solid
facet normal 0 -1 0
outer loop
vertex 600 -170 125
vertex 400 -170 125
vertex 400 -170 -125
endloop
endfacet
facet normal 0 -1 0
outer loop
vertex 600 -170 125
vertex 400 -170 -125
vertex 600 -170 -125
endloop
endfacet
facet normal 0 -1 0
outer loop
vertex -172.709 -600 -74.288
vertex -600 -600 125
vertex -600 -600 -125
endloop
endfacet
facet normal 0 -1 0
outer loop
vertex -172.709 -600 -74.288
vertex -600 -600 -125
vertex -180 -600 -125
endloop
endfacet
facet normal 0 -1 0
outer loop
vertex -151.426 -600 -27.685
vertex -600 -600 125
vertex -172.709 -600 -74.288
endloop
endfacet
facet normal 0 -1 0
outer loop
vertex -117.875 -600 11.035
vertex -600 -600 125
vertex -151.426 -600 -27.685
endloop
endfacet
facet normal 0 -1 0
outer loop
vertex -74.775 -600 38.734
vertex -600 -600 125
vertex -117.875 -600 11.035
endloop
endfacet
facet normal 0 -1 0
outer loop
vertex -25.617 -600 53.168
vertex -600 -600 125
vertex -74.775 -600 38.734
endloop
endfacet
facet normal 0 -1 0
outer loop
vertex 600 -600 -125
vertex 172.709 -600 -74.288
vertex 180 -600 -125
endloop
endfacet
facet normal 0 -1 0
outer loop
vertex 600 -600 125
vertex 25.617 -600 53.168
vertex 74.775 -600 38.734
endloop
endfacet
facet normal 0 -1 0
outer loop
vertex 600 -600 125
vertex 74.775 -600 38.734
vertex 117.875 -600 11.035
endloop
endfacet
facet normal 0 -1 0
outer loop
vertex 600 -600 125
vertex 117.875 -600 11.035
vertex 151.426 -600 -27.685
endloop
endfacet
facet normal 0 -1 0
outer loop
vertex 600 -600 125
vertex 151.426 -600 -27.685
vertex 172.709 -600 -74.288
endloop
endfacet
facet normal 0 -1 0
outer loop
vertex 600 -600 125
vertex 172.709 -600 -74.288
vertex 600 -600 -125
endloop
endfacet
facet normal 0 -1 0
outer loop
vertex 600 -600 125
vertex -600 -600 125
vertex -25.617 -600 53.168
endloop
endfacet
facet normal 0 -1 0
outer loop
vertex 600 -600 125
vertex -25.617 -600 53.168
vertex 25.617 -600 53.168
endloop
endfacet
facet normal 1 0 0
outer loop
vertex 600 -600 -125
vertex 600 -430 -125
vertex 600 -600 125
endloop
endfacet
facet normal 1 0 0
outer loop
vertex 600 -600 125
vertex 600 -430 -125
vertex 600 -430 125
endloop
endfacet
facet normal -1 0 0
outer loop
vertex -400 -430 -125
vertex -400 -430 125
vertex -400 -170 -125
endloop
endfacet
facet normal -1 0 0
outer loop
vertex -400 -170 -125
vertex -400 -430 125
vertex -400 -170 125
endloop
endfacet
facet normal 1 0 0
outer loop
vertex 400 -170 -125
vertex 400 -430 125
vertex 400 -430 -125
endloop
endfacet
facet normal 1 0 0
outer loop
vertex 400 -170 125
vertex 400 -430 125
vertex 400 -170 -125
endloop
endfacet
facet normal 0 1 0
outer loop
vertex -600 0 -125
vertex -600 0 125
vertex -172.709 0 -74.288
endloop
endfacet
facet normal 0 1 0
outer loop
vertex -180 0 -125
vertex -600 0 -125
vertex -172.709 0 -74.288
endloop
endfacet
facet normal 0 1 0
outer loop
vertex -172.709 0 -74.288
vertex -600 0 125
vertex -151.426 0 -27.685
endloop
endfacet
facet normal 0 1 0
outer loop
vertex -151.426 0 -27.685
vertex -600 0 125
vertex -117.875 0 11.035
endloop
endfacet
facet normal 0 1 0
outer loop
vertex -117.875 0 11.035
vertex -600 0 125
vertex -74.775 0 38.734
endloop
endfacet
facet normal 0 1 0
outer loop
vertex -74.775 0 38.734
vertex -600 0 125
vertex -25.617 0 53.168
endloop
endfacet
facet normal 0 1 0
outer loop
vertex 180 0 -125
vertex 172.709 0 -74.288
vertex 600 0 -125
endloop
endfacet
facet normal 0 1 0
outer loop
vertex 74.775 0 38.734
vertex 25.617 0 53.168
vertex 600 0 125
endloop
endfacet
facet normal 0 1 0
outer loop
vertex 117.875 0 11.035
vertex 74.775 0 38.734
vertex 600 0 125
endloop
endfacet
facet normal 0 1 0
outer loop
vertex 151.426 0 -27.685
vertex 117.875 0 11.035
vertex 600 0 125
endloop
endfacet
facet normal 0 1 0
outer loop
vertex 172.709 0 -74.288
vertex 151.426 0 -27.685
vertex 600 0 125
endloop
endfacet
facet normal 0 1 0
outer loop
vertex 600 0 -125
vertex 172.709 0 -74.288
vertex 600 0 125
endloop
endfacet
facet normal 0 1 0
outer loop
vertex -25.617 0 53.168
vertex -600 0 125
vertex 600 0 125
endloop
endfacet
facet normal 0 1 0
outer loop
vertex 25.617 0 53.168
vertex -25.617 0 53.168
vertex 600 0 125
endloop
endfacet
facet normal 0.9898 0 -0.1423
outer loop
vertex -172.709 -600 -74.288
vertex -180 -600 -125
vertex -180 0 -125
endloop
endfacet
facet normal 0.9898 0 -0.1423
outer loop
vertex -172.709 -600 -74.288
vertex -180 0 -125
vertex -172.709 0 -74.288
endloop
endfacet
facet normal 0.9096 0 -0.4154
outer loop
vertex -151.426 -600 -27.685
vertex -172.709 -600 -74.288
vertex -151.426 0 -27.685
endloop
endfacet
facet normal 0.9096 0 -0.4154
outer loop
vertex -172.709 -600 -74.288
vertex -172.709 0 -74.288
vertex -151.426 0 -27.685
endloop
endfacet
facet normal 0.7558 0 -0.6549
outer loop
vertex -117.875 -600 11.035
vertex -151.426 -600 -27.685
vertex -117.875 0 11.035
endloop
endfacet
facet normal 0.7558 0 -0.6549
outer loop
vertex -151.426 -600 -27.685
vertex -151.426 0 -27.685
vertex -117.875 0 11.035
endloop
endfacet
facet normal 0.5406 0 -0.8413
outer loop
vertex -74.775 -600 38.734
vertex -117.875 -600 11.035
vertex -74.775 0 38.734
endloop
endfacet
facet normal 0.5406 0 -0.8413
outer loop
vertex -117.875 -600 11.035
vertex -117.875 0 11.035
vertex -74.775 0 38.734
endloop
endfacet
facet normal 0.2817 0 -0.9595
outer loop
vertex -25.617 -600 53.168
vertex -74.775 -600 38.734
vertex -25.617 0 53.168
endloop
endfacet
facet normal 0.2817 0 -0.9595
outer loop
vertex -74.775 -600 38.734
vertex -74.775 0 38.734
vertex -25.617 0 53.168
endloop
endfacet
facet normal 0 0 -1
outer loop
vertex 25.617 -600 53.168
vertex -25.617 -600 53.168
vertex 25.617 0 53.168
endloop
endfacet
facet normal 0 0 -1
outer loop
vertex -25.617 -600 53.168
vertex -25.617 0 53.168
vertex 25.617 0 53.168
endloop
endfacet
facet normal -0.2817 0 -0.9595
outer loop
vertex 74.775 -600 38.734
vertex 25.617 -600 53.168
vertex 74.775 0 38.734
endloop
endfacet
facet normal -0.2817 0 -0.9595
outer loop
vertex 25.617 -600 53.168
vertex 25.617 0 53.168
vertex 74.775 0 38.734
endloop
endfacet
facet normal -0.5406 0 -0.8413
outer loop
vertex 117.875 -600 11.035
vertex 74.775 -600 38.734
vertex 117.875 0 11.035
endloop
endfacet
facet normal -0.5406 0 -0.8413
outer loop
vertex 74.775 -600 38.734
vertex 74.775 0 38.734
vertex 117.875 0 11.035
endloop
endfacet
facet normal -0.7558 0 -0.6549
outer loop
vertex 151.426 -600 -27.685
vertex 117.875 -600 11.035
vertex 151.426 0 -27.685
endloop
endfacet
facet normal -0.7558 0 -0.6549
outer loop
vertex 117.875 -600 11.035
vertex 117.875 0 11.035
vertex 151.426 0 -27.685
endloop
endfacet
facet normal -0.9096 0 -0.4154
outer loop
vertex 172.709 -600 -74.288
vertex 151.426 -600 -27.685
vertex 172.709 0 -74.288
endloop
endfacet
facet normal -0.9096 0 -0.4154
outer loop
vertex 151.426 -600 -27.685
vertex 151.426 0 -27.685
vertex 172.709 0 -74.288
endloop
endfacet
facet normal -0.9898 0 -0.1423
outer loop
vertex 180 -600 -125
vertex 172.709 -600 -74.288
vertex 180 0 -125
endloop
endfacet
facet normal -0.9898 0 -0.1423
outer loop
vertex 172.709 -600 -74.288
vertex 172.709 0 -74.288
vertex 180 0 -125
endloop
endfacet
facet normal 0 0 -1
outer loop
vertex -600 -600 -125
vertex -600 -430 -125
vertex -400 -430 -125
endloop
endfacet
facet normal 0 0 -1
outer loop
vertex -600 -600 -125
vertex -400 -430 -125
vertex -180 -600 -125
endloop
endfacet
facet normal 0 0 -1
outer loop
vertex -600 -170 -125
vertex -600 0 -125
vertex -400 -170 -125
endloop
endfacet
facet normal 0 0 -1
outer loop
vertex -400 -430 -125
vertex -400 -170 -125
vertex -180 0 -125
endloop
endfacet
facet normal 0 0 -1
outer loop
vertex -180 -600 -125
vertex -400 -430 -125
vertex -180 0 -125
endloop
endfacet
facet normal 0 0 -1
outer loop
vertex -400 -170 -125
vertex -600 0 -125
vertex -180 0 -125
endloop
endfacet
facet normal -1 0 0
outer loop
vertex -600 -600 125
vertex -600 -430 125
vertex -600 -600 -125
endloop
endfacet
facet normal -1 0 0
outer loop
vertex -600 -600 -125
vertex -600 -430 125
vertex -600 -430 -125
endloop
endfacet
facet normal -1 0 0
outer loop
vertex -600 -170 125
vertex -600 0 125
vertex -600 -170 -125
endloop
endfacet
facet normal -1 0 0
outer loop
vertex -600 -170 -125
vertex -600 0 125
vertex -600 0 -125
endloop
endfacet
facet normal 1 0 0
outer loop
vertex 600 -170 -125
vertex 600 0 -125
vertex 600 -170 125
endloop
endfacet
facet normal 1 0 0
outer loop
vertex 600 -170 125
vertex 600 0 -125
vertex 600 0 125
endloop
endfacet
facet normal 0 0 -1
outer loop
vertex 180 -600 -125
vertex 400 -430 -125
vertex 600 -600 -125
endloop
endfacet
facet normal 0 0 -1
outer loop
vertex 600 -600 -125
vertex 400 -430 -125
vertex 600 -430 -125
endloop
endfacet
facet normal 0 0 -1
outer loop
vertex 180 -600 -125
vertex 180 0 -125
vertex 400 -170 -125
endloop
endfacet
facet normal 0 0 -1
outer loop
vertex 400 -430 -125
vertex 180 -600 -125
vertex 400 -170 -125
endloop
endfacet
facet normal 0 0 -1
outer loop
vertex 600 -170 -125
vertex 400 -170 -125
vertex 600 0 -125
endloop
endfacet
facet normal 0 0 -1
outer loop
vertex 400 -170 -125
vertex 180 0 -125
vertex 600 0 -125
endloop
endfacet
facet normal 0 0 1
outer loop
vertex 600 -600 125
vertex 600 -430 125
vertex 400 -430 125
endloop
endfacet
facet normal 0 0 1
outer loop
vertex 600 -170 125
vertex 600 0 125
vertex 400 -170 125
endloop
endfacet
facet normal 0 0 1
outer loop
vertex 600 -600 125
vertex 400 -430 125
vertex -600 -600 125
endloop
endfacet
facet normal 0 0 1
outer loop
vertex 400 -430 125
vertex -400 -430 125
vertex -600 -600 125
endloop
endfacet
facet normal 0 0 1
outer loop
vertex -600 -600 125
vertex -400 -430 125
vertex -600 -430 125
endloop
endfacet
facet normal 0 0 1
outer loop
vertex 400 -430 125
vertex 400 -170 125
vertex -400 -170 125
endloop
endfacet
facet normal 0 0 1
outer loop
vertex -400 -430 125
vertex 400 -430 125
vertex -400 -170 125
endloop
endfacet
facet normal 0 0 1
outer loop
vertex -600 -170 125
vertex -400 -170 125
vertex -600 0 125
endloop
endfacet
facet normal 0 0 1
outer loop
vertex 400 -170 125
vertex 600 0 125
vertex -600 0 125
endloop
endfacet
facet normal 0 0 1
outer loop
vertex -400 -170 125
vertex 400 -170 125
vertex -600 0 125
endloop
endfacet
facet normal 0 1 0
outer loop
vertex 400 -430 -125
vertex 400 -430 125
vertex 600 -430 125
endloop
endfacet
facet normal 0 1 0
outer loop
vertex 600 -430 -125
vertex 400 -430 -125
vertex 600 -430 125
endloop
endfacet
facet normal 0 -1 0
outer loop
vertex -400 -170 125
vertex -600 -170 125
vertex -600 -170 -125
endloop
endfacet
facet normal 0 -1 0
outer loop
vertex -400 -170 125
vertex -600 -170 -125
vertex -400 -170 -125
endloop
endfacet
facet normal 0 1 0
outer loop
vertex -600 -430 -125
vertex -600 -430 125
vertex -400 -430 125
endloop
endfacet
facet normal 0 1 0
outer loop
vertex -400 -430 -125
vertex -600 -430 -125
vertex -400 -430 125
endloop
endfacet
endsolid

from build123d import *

# Parameters (mm, degrees)
F1_DEPTH = 600
F2_W     = 200
F2_H     = 260
F3_DEPTH = 250.001
F4_W     = 200
F4_H     = 260
F5_DEPTH = 250.001


with BuildPart() as f1:
    # F0 (on Front) → F1 (new body)
    with BuildSketch(Plane.XZ):
        with BuildLine():
            Line((600, 125), (-600, 125))
            Line((-600, 125), (-600, -125))
            Line((-600, -125), (-180, -125))
            ThreePointArc((-180, -125), (0, 55), (180, -125))
            Line((180, -125), (600, -125))
            Line((600, -125), (600, 125))
        make_face()
    extrude(amount=F1_DEPTH)

    # F2 (on face) → F3 (cut, through all)
    with BuildSketch(Plane.XY.offset(125)):
        with Locations((500, -300)):
            Rectangle(F2_W, F2_H)
    extrude(amount=-F3_DEPTH, mode=Mode.SUBTRACT)

    # F4 (on face) → F5 (cut, through all)
    with BuildSketch(Plane.XY.offset(125)):
        with Locations((-500, -300)):
            Rectangle(F4_W, F4_H)
    extrude(amount=-F5_DEPTH, mode=Mode.SUBTRACT)


solid = f1.part
